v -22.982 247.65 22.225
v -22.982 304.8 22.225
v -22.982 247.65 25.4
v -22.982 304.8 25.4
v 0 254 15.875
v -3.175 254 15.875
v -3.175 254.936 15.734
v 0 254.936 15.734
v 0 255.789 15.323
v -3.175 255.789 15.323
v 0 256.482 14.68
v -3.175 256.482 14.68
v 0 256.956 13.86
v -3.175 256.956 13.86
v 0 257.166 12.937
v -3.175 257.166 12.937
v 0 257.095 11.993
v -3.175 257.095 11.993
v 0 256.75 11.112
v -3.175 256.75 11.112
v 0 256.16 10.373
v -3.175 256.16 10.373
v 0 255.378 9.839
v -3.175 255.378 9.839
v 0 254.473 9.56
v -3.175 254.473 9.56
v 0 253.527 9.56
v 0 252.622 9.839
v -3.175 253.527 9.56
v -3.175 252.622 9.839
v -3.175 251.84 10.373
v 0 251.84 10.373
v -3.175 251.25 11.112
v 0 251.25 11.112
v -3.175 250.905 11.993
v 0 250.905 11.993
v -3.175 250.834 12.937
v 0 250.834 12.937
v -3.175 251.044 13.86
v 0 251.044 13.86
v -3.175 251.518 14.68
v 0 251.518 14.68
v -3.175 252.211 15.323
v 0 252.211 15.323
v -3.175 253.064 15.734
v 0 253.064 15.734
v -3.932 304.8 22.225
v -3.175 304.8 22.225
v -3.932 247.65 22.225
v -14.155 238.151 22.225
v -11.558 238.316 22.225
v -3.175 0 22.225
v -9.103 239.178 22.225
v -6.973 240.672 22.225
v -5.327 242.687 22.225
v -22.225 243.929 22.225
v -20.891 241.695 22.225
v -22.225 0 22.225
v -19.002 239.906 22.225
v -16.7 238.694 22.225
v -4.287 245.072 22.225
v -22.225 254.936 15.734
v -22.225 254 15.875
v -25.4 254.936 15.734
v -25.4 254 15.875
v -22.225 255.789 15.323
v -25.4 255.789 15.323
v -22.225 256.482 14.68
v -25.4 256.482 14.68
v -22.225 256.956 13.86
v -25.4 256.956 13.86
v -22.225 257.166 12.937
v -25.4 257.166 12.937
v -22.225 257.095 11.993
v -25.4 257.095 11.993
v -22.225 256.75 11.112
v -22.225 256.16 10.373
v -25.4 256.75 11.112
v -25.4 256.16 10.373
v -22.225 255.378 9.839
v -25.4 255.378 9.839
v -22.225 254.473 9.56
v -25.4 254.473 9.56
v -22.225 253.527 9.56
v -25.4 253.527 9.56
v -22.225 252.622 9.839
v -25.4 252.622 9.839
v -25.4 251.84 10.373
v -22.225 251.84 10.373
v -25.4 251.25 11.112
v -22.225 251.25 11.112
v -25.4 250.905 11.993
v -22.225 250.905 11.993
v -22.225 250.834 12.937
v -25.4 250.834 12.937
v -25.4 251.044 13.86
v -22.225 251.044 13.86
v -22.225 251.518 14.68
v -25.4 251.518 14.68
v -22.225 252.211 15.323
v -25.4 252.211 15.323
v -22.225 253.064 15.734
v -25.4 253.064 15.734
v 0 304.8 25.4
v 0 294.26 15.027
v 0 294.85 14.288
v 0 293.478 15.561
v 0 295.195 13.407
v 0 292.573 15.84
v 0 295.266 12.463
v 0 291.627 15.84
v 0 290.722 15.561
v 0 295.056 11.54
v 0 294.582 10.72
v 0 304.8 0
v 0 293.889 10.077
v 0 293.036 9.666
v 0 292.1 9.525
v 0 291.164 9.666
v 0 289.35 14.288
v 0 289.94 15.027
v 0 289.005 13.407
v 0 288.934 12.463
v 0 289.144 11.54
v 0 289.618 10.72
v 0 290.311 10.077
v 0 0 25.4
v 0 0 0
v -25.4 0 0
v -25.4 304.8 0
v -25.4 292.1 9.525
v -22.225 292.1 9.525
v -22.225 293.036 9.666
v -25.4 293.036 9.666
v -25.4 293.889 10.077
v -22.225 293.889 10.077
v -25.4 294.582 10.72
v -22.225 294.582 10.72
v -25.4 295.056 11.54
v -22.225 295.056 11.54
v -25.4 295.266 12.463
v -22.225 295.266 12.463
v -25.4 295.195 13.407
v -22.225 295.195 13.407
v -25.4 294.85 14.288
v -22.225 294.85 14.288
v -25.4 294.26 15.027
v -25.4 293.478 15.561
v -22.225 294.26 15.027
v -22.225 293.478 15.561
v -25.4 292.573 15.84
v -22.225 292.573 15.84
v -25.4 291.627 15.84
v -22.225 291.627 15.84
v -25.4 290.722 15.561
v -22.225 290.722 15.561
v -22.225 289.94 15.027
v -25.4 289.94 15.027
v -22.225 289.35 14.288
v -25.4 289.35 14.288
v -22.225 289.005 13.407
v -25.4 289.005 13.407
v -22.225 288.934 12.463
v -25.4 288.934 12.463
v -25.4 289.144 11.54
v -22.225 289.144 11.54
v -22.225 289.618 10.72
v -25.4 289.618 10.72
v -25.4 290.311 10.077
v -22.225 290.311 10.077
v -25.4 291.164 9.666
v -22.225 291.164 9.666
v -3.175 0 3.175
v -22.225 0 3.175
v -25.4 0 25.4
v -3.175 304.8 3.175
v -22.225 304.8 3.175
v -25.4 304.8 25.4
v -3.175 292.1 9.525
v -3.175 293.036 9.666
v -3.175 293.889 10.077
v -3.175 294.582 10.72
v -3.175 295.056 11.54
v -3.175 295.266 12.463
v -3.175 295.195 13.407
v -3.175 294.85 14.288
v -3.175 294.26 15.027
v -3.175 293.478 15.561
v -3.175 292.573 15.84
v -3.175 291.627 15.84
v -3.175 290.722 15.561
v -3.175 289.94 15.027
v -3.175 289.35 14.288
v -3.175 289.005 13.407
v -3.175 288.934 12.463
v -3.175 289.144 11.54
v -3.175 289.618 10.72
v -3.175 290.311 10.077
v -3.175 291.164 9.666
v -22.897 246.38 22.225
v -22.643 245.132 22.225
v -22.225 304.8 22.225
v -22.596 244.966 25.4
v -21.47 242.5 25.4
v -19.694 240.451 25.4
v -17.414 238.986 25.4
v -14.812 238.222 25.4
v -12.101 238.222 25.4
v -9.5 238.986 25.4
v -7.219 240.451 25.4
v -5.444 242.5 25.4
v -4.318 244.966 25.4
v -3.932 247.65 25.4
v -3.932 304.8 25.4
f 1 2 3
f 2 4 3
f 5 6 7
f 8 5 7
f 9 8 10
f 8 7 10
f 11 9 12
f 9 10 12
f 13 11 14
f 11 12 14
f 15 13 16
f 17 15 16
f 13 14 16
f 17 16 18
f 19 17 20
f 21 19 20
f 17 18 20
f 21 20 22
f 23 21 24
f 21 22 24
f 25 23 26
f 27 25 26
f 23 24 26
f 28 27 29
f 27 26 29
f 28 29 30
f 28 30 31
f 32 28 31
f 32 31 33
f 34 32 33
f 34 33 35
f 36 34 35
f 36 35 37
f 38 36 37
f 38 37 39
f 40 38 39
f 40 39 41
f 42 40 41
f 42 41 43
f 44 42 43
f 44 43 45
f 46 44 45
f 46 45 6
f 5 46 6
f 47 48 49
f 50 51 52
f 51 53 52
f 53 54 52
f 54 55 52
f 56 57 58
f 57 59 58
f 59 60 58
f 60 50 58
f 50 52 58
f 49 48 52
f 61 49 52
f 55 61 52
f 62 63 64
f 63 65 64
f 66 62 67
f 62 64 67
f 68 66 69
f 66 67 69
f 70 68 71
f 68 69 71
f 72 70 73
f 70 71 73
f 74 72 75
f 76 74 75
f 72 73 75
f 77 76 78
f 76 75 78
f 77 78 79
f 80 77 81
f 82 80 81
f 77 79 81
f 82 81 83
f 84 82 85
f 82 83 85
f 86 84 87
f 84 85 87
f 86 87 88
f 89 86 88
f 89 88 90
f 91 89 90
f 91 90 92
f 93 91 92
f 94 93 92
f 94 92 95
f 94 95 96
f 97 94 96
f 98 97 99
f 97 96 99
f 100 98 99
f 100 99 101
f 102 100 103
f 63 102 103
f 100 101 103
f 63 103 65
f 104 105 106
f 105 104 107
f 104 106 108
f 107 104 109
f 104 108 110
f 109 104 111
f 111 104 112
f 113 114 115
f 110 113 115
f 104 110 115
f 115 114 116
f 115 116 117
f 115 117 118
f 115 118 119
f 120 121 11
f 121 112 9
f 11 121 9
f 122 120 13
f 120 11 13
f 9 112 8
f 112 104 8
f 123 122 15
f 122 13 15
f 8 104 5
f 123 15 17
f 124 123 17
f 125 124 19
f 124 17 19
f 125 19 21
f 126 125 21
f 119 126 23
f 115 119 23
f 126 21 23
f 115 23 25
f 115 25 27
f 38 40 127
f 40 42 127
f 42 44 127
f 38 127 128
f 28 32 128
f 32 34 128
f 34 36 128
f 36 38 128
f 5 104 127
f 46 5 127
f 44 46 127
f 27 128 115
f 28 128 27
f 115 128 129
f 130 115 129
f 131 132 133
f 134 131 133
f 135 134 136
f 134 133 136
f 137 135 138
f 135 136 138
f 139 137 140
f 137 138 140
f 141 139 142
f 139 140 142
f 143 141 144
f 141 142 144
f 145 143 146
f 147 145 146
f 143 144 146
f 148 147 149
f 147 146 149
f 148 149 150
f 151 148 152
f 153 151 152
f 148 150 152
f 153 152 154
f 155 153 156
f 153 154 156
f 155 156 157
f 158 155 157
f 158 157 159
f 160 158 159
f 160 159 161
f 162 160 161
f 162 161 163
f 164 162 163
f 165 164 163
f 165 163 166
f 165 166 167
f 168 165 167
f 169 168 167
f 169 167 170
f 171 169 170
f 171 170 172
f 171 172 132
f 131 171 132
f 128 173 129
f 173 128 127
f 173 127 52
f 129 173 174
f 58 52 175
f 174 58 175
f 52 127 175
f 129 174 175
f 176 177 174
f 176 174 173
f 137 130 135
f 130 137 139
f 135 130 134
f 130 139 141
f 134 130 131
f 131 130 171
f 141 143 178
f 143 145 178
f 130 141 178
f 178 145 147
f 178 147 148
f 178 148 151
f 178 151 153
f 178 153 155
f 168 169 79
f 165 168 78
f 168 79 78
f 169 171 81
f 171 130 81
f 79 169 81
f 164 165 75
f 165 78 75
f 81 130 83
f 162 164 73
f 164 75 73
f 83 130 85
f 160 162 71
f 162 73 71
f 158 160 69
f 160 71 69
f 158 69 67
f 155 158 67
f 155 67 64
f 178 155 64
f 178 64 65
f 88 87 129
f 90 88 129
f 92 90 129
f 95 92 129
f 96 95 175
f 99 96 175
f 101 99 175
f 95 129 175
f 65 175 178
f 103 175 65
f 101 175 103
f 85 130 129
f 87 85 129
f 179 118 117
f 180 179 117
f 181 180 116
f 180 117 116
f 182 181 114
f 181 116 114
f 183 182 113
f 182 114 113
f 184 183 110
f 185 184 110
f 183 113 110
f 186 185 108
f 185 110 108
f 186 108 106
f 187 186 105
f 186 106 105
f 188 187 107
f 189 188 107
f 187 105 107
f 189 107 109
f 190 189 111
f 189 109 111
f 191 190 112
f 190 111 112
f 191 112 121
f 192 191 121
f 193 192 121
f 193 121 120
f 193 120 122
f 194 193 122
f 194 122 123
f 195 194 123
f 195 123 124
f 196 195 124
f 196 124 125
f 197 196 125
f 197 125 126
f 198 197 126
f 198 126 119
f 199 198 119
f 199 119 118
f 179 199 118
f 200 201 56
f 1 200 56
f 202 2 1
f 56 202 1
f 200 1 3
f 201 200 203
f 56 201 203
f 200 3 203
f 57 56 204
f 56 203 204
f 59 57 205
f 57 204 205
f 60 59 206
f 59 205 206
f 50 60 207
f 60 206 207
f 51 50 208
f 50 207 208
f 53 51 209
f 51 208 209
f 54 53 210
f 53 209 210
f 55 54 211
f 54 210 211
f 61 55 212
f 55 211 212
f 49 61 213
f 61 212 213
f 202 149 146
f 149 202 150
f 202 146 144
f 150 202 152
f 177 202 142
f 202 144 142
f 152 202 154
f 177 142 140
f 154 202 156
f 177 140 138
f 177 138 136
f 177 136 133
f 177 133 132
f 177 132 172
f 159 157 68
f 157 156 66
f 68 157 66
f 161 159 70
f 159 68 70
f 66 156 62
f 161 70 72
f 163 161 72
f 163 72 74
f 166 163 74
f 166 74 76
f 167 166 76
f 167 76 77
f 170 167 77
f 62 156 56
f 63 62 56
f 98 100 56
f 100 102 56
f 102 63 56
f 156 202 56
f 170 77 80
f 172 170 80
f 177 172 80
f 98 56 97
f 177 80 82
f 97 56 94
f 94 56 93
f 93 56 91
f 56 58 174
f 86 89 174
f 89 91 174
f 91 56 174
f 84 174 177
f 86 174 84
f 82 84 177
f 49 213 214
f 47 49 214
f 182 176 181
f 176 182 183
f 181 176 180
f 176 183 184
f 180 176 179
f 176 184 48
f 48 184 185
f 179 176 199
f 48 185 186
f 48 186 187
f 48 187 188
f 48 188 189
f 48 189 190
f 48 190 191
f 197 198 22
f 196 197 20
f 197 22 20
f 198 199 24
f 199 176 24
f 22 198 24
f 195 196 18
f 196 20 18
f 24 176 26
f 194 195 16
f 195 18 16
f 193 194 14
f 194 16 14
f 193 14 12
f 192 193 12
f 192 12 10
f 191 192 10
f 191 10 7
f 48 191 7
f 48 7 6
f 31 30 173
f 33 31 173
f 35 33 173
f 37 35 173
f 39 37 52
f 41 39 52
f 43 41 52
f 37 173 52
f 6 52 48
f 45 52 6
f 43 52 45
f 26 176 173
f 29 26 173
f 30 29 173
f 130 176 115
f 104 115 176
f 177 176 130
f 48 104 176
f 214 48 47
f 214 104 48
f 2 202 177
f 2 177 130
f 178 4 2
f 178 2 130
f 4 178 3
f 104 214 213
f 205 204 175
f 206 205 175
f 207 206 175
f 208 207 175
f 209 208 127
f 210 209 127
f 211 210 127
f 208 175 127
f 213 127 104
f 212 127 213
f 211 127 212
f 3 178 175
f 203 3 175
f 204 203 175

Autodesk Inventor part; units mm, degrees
ref_plane "YZ Plane" through (0, 0, 0) normal (1, 0, 0) x (0, 1, 0)
ref_plane "XZ Plane" through (0, 0, 0) normal (0, 1, 0) x (-1, 0, 0)
ref_plane "XY Plane" through (0, 0, 0) normal (0, 0, 1) x (1, 0, 0)
sketch "Sketch1" plane through (0, 0, 0) normal (0, 1, 0) x (-1, 0, 0)
  line L0 (0, 0) -> (25.4, 0)
  line L1 (25.4, 0) -> (25.4, 25.4)
  line L2 (25.4, 25.4) -> (0, 25.4)
  line L3 (0, 25.4) -> (0, 0)
  line L4 (3.175, 22.225) -> (22.225, 22.225)
  line L5 (22.225, 22.225) -> (22.225, 3.175)
  line L6 (22.225, 3.175) -> (3.175, 3.175)
  line L7 (3.175, 3.175) -> (3.175, 22.225)
  dimension "d0" = 25.4
  dimension "d1" = 25.4
  dimension "d4" = 3.175
  dimension "d5" = 3.175
  dimension "d6" = 3.175
  dimension "d7" = 3.175
extrude "Extrusion1" add sketch "Sketch1" along normal blind 304.8
sketch "Sketch2" plane through (0, 0, 25.4) normal (1, 0, 0) x (0, 0, -1)
  circle A0 centre (12.7, 292.1) radius 3.175
  line L0 (22.225, 304.8) -> (3.175, 304.8) projected
  line L1 (0, 0) -> (0, 304.8) projected
  point P0 (25.4, 0)
  dimension "d10" = 6.35
  dimension "d11" = 12.7
  dimension "d12" = 12.7
extrude "Extrusion2" cut sketch "Sketch2" against normal blind 304.8
sketch "Sketch3" plane through (-25.4, 0, 0) normal (-1, 0, 0) x (0, 0, 1)
  circle A0 centre (12.7, 254) radius 3.175
  line L0 (0, 304.8) -> (25.4, 304.8) projected
  line L1 (0, 0) -> (0, 304.8) projected
  dimension "d15" = 6.35
  dimension "d16" = 50.8
  dimension "d17" = 12.7
extrude "Extrusion3" cut sketch "Sketch3" against normal blind 25.4
sketch "Sketch4" plane through (-25.4, 0, 25.4) normal (0, 0, 1) x (1, 0, 0)
  line L0 (11.9432, 247.65) -> (11.9432, 304.8) construction
  line L1 (21.4682, 247.65) -> (21.4682, 304.8)
  line L2 (2.4182, 304.8) -> (2.4182, 247.65)
  arc A0 (2.4182, 247.65) -> (21.4682, 247.65) centre (11.9432, 247.65) ccw
  arc A1 (21.4682, 304.8) -> (2.4182, 304.8) centre (11.9432, 304.8) ccw
  line L3 (0, 0) -> (25.4, 0) projected
  line L4 (0, 0) -> (0, 304.8) projected
  line L5 (22.225, 304.8) -> (3.175, 304.8) projected
  point P0 (11.9432, 276.225)
  dimension "d20" = 57.15
  dimension "d22" = 11.9432
  dimension "d23" = 0
  dimension "d24" = 19.05
extrude "Extrusion4" cut sketch "Sketch4" against normal blind 3.175
equation "\"d5\" = d4"
equation "\"d6\" = d4"
equation "\"d7\" = d4"
properties part number "Substitute Sucker Arm"
